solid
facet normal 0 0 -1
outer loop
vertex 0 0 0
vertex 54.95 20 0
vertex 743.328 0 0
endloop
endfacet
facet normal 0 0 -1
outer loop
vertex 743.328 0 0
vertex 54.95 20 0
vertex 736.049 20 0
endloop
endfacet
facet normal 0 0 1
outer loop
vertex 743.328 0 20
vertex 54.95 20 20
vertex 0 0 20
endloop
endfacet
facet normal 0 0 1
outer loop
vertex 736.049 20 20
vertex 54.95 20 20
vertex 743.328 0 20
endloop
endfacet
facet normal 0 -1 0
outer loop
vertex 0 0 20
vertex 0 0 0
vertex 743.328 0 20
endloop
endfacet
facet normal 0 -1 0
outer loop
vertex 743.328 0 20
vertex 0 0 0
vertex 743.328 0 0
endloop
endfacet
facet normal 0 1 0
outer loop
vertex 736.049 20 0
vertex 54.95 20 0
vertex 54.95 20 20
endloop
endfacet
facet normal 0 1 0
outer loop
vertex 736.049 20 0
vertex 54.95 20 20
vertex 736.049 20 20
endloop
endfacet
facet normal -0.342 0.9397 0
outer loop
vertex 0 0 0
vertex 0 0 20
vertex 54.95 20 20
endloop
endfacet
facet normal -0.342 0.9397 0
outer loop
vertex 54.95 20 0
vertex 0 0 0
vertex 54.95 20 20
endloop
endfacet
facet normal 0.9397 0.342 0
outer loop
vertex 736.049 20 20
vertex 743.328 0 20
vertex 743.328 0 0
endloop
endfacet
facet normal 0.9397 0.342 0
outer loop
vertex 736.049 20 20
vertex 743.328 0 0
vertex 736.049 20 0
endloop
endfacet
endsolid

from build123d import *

# Parameters (mm, degrees)
SKETCH1_W               = 987.806
SKETCH1_H               = 20
BOSS_EXTRUDE1_DEPTH     = 20
CUT_EXTRUDE1_DEPTH      = 20
CUT_EXTRUDE4_DEPTH      = 989.210854846
CUT_EXTRUDE5_DEPTH      = 989.210854846
CUT_EXTRUDE5_DEPTH_BACK = 989.210854846
CUT_EXTRUDE9_DEPTH      = 768.684470274


with BuildPart() as part:
    # Sketch1 → Boss-Extrude1 (new body)
    with BuildSketch(Plane.XY):
        with Locations((493.903, 10)):
            Rectangle(SKETCH1_W, SKETCH1_H)
    extrude(amount=BOSS_EXTRUDE1_DEPTH)

    # Sketch2 → Cut-Extrude1 (cut)
    with BuildSketch(Plane.XY.offset(20)):
        Polygon((0, 20), (0, 0), (54.949548389, 20), align=None)
    extrude(amount=-CUT_EXTRUDE1_DEPTH, mode=Mode.SUBTRACT)

    # Sketch5 → Cut-Extrude4 (cut, through all)
    with BuildSketch(Plane.XY.offset(20)):
        Polygon((987.806, 20), (980.526595315, 0), (987.806, 0), align=None)
    extrude(amount=-CUT_EXTRUDE4_DEPTH, mode=Mode.SUBTRACT)

    # Sketch7 → Cut-Extrude5 (cut, two sides: drawn at the far end of the back side and taken through both)
    with BuildSketch(Plane.XY.offset(20).offset(-CUT_EXTRUDE5_DEPTH_BACK)):
        Polygon((743.328174074, 0), (980.526595315, 0), (987.806, 20), (767.163245926, 20), align=None)
    extrude(amount=CUT_EXTRUDE5_DEPTH + CUT_EXTRUDE5_DEPTH_BACK, mode=Mode.SUBTRACT)

    # Sketch8 → Cut-Extrude9 (cut, through all)
    with BuildSketch(Plane.XY.offset(20)):
        Polygon((743.328174074, 0), (736.048769389, 20), (767.163245926, 20), align=None)
    extrude(amount=-CUT_EXTRUDE9_DEPTH, mode=Mode.SUBTRACT)


solid = part.part
